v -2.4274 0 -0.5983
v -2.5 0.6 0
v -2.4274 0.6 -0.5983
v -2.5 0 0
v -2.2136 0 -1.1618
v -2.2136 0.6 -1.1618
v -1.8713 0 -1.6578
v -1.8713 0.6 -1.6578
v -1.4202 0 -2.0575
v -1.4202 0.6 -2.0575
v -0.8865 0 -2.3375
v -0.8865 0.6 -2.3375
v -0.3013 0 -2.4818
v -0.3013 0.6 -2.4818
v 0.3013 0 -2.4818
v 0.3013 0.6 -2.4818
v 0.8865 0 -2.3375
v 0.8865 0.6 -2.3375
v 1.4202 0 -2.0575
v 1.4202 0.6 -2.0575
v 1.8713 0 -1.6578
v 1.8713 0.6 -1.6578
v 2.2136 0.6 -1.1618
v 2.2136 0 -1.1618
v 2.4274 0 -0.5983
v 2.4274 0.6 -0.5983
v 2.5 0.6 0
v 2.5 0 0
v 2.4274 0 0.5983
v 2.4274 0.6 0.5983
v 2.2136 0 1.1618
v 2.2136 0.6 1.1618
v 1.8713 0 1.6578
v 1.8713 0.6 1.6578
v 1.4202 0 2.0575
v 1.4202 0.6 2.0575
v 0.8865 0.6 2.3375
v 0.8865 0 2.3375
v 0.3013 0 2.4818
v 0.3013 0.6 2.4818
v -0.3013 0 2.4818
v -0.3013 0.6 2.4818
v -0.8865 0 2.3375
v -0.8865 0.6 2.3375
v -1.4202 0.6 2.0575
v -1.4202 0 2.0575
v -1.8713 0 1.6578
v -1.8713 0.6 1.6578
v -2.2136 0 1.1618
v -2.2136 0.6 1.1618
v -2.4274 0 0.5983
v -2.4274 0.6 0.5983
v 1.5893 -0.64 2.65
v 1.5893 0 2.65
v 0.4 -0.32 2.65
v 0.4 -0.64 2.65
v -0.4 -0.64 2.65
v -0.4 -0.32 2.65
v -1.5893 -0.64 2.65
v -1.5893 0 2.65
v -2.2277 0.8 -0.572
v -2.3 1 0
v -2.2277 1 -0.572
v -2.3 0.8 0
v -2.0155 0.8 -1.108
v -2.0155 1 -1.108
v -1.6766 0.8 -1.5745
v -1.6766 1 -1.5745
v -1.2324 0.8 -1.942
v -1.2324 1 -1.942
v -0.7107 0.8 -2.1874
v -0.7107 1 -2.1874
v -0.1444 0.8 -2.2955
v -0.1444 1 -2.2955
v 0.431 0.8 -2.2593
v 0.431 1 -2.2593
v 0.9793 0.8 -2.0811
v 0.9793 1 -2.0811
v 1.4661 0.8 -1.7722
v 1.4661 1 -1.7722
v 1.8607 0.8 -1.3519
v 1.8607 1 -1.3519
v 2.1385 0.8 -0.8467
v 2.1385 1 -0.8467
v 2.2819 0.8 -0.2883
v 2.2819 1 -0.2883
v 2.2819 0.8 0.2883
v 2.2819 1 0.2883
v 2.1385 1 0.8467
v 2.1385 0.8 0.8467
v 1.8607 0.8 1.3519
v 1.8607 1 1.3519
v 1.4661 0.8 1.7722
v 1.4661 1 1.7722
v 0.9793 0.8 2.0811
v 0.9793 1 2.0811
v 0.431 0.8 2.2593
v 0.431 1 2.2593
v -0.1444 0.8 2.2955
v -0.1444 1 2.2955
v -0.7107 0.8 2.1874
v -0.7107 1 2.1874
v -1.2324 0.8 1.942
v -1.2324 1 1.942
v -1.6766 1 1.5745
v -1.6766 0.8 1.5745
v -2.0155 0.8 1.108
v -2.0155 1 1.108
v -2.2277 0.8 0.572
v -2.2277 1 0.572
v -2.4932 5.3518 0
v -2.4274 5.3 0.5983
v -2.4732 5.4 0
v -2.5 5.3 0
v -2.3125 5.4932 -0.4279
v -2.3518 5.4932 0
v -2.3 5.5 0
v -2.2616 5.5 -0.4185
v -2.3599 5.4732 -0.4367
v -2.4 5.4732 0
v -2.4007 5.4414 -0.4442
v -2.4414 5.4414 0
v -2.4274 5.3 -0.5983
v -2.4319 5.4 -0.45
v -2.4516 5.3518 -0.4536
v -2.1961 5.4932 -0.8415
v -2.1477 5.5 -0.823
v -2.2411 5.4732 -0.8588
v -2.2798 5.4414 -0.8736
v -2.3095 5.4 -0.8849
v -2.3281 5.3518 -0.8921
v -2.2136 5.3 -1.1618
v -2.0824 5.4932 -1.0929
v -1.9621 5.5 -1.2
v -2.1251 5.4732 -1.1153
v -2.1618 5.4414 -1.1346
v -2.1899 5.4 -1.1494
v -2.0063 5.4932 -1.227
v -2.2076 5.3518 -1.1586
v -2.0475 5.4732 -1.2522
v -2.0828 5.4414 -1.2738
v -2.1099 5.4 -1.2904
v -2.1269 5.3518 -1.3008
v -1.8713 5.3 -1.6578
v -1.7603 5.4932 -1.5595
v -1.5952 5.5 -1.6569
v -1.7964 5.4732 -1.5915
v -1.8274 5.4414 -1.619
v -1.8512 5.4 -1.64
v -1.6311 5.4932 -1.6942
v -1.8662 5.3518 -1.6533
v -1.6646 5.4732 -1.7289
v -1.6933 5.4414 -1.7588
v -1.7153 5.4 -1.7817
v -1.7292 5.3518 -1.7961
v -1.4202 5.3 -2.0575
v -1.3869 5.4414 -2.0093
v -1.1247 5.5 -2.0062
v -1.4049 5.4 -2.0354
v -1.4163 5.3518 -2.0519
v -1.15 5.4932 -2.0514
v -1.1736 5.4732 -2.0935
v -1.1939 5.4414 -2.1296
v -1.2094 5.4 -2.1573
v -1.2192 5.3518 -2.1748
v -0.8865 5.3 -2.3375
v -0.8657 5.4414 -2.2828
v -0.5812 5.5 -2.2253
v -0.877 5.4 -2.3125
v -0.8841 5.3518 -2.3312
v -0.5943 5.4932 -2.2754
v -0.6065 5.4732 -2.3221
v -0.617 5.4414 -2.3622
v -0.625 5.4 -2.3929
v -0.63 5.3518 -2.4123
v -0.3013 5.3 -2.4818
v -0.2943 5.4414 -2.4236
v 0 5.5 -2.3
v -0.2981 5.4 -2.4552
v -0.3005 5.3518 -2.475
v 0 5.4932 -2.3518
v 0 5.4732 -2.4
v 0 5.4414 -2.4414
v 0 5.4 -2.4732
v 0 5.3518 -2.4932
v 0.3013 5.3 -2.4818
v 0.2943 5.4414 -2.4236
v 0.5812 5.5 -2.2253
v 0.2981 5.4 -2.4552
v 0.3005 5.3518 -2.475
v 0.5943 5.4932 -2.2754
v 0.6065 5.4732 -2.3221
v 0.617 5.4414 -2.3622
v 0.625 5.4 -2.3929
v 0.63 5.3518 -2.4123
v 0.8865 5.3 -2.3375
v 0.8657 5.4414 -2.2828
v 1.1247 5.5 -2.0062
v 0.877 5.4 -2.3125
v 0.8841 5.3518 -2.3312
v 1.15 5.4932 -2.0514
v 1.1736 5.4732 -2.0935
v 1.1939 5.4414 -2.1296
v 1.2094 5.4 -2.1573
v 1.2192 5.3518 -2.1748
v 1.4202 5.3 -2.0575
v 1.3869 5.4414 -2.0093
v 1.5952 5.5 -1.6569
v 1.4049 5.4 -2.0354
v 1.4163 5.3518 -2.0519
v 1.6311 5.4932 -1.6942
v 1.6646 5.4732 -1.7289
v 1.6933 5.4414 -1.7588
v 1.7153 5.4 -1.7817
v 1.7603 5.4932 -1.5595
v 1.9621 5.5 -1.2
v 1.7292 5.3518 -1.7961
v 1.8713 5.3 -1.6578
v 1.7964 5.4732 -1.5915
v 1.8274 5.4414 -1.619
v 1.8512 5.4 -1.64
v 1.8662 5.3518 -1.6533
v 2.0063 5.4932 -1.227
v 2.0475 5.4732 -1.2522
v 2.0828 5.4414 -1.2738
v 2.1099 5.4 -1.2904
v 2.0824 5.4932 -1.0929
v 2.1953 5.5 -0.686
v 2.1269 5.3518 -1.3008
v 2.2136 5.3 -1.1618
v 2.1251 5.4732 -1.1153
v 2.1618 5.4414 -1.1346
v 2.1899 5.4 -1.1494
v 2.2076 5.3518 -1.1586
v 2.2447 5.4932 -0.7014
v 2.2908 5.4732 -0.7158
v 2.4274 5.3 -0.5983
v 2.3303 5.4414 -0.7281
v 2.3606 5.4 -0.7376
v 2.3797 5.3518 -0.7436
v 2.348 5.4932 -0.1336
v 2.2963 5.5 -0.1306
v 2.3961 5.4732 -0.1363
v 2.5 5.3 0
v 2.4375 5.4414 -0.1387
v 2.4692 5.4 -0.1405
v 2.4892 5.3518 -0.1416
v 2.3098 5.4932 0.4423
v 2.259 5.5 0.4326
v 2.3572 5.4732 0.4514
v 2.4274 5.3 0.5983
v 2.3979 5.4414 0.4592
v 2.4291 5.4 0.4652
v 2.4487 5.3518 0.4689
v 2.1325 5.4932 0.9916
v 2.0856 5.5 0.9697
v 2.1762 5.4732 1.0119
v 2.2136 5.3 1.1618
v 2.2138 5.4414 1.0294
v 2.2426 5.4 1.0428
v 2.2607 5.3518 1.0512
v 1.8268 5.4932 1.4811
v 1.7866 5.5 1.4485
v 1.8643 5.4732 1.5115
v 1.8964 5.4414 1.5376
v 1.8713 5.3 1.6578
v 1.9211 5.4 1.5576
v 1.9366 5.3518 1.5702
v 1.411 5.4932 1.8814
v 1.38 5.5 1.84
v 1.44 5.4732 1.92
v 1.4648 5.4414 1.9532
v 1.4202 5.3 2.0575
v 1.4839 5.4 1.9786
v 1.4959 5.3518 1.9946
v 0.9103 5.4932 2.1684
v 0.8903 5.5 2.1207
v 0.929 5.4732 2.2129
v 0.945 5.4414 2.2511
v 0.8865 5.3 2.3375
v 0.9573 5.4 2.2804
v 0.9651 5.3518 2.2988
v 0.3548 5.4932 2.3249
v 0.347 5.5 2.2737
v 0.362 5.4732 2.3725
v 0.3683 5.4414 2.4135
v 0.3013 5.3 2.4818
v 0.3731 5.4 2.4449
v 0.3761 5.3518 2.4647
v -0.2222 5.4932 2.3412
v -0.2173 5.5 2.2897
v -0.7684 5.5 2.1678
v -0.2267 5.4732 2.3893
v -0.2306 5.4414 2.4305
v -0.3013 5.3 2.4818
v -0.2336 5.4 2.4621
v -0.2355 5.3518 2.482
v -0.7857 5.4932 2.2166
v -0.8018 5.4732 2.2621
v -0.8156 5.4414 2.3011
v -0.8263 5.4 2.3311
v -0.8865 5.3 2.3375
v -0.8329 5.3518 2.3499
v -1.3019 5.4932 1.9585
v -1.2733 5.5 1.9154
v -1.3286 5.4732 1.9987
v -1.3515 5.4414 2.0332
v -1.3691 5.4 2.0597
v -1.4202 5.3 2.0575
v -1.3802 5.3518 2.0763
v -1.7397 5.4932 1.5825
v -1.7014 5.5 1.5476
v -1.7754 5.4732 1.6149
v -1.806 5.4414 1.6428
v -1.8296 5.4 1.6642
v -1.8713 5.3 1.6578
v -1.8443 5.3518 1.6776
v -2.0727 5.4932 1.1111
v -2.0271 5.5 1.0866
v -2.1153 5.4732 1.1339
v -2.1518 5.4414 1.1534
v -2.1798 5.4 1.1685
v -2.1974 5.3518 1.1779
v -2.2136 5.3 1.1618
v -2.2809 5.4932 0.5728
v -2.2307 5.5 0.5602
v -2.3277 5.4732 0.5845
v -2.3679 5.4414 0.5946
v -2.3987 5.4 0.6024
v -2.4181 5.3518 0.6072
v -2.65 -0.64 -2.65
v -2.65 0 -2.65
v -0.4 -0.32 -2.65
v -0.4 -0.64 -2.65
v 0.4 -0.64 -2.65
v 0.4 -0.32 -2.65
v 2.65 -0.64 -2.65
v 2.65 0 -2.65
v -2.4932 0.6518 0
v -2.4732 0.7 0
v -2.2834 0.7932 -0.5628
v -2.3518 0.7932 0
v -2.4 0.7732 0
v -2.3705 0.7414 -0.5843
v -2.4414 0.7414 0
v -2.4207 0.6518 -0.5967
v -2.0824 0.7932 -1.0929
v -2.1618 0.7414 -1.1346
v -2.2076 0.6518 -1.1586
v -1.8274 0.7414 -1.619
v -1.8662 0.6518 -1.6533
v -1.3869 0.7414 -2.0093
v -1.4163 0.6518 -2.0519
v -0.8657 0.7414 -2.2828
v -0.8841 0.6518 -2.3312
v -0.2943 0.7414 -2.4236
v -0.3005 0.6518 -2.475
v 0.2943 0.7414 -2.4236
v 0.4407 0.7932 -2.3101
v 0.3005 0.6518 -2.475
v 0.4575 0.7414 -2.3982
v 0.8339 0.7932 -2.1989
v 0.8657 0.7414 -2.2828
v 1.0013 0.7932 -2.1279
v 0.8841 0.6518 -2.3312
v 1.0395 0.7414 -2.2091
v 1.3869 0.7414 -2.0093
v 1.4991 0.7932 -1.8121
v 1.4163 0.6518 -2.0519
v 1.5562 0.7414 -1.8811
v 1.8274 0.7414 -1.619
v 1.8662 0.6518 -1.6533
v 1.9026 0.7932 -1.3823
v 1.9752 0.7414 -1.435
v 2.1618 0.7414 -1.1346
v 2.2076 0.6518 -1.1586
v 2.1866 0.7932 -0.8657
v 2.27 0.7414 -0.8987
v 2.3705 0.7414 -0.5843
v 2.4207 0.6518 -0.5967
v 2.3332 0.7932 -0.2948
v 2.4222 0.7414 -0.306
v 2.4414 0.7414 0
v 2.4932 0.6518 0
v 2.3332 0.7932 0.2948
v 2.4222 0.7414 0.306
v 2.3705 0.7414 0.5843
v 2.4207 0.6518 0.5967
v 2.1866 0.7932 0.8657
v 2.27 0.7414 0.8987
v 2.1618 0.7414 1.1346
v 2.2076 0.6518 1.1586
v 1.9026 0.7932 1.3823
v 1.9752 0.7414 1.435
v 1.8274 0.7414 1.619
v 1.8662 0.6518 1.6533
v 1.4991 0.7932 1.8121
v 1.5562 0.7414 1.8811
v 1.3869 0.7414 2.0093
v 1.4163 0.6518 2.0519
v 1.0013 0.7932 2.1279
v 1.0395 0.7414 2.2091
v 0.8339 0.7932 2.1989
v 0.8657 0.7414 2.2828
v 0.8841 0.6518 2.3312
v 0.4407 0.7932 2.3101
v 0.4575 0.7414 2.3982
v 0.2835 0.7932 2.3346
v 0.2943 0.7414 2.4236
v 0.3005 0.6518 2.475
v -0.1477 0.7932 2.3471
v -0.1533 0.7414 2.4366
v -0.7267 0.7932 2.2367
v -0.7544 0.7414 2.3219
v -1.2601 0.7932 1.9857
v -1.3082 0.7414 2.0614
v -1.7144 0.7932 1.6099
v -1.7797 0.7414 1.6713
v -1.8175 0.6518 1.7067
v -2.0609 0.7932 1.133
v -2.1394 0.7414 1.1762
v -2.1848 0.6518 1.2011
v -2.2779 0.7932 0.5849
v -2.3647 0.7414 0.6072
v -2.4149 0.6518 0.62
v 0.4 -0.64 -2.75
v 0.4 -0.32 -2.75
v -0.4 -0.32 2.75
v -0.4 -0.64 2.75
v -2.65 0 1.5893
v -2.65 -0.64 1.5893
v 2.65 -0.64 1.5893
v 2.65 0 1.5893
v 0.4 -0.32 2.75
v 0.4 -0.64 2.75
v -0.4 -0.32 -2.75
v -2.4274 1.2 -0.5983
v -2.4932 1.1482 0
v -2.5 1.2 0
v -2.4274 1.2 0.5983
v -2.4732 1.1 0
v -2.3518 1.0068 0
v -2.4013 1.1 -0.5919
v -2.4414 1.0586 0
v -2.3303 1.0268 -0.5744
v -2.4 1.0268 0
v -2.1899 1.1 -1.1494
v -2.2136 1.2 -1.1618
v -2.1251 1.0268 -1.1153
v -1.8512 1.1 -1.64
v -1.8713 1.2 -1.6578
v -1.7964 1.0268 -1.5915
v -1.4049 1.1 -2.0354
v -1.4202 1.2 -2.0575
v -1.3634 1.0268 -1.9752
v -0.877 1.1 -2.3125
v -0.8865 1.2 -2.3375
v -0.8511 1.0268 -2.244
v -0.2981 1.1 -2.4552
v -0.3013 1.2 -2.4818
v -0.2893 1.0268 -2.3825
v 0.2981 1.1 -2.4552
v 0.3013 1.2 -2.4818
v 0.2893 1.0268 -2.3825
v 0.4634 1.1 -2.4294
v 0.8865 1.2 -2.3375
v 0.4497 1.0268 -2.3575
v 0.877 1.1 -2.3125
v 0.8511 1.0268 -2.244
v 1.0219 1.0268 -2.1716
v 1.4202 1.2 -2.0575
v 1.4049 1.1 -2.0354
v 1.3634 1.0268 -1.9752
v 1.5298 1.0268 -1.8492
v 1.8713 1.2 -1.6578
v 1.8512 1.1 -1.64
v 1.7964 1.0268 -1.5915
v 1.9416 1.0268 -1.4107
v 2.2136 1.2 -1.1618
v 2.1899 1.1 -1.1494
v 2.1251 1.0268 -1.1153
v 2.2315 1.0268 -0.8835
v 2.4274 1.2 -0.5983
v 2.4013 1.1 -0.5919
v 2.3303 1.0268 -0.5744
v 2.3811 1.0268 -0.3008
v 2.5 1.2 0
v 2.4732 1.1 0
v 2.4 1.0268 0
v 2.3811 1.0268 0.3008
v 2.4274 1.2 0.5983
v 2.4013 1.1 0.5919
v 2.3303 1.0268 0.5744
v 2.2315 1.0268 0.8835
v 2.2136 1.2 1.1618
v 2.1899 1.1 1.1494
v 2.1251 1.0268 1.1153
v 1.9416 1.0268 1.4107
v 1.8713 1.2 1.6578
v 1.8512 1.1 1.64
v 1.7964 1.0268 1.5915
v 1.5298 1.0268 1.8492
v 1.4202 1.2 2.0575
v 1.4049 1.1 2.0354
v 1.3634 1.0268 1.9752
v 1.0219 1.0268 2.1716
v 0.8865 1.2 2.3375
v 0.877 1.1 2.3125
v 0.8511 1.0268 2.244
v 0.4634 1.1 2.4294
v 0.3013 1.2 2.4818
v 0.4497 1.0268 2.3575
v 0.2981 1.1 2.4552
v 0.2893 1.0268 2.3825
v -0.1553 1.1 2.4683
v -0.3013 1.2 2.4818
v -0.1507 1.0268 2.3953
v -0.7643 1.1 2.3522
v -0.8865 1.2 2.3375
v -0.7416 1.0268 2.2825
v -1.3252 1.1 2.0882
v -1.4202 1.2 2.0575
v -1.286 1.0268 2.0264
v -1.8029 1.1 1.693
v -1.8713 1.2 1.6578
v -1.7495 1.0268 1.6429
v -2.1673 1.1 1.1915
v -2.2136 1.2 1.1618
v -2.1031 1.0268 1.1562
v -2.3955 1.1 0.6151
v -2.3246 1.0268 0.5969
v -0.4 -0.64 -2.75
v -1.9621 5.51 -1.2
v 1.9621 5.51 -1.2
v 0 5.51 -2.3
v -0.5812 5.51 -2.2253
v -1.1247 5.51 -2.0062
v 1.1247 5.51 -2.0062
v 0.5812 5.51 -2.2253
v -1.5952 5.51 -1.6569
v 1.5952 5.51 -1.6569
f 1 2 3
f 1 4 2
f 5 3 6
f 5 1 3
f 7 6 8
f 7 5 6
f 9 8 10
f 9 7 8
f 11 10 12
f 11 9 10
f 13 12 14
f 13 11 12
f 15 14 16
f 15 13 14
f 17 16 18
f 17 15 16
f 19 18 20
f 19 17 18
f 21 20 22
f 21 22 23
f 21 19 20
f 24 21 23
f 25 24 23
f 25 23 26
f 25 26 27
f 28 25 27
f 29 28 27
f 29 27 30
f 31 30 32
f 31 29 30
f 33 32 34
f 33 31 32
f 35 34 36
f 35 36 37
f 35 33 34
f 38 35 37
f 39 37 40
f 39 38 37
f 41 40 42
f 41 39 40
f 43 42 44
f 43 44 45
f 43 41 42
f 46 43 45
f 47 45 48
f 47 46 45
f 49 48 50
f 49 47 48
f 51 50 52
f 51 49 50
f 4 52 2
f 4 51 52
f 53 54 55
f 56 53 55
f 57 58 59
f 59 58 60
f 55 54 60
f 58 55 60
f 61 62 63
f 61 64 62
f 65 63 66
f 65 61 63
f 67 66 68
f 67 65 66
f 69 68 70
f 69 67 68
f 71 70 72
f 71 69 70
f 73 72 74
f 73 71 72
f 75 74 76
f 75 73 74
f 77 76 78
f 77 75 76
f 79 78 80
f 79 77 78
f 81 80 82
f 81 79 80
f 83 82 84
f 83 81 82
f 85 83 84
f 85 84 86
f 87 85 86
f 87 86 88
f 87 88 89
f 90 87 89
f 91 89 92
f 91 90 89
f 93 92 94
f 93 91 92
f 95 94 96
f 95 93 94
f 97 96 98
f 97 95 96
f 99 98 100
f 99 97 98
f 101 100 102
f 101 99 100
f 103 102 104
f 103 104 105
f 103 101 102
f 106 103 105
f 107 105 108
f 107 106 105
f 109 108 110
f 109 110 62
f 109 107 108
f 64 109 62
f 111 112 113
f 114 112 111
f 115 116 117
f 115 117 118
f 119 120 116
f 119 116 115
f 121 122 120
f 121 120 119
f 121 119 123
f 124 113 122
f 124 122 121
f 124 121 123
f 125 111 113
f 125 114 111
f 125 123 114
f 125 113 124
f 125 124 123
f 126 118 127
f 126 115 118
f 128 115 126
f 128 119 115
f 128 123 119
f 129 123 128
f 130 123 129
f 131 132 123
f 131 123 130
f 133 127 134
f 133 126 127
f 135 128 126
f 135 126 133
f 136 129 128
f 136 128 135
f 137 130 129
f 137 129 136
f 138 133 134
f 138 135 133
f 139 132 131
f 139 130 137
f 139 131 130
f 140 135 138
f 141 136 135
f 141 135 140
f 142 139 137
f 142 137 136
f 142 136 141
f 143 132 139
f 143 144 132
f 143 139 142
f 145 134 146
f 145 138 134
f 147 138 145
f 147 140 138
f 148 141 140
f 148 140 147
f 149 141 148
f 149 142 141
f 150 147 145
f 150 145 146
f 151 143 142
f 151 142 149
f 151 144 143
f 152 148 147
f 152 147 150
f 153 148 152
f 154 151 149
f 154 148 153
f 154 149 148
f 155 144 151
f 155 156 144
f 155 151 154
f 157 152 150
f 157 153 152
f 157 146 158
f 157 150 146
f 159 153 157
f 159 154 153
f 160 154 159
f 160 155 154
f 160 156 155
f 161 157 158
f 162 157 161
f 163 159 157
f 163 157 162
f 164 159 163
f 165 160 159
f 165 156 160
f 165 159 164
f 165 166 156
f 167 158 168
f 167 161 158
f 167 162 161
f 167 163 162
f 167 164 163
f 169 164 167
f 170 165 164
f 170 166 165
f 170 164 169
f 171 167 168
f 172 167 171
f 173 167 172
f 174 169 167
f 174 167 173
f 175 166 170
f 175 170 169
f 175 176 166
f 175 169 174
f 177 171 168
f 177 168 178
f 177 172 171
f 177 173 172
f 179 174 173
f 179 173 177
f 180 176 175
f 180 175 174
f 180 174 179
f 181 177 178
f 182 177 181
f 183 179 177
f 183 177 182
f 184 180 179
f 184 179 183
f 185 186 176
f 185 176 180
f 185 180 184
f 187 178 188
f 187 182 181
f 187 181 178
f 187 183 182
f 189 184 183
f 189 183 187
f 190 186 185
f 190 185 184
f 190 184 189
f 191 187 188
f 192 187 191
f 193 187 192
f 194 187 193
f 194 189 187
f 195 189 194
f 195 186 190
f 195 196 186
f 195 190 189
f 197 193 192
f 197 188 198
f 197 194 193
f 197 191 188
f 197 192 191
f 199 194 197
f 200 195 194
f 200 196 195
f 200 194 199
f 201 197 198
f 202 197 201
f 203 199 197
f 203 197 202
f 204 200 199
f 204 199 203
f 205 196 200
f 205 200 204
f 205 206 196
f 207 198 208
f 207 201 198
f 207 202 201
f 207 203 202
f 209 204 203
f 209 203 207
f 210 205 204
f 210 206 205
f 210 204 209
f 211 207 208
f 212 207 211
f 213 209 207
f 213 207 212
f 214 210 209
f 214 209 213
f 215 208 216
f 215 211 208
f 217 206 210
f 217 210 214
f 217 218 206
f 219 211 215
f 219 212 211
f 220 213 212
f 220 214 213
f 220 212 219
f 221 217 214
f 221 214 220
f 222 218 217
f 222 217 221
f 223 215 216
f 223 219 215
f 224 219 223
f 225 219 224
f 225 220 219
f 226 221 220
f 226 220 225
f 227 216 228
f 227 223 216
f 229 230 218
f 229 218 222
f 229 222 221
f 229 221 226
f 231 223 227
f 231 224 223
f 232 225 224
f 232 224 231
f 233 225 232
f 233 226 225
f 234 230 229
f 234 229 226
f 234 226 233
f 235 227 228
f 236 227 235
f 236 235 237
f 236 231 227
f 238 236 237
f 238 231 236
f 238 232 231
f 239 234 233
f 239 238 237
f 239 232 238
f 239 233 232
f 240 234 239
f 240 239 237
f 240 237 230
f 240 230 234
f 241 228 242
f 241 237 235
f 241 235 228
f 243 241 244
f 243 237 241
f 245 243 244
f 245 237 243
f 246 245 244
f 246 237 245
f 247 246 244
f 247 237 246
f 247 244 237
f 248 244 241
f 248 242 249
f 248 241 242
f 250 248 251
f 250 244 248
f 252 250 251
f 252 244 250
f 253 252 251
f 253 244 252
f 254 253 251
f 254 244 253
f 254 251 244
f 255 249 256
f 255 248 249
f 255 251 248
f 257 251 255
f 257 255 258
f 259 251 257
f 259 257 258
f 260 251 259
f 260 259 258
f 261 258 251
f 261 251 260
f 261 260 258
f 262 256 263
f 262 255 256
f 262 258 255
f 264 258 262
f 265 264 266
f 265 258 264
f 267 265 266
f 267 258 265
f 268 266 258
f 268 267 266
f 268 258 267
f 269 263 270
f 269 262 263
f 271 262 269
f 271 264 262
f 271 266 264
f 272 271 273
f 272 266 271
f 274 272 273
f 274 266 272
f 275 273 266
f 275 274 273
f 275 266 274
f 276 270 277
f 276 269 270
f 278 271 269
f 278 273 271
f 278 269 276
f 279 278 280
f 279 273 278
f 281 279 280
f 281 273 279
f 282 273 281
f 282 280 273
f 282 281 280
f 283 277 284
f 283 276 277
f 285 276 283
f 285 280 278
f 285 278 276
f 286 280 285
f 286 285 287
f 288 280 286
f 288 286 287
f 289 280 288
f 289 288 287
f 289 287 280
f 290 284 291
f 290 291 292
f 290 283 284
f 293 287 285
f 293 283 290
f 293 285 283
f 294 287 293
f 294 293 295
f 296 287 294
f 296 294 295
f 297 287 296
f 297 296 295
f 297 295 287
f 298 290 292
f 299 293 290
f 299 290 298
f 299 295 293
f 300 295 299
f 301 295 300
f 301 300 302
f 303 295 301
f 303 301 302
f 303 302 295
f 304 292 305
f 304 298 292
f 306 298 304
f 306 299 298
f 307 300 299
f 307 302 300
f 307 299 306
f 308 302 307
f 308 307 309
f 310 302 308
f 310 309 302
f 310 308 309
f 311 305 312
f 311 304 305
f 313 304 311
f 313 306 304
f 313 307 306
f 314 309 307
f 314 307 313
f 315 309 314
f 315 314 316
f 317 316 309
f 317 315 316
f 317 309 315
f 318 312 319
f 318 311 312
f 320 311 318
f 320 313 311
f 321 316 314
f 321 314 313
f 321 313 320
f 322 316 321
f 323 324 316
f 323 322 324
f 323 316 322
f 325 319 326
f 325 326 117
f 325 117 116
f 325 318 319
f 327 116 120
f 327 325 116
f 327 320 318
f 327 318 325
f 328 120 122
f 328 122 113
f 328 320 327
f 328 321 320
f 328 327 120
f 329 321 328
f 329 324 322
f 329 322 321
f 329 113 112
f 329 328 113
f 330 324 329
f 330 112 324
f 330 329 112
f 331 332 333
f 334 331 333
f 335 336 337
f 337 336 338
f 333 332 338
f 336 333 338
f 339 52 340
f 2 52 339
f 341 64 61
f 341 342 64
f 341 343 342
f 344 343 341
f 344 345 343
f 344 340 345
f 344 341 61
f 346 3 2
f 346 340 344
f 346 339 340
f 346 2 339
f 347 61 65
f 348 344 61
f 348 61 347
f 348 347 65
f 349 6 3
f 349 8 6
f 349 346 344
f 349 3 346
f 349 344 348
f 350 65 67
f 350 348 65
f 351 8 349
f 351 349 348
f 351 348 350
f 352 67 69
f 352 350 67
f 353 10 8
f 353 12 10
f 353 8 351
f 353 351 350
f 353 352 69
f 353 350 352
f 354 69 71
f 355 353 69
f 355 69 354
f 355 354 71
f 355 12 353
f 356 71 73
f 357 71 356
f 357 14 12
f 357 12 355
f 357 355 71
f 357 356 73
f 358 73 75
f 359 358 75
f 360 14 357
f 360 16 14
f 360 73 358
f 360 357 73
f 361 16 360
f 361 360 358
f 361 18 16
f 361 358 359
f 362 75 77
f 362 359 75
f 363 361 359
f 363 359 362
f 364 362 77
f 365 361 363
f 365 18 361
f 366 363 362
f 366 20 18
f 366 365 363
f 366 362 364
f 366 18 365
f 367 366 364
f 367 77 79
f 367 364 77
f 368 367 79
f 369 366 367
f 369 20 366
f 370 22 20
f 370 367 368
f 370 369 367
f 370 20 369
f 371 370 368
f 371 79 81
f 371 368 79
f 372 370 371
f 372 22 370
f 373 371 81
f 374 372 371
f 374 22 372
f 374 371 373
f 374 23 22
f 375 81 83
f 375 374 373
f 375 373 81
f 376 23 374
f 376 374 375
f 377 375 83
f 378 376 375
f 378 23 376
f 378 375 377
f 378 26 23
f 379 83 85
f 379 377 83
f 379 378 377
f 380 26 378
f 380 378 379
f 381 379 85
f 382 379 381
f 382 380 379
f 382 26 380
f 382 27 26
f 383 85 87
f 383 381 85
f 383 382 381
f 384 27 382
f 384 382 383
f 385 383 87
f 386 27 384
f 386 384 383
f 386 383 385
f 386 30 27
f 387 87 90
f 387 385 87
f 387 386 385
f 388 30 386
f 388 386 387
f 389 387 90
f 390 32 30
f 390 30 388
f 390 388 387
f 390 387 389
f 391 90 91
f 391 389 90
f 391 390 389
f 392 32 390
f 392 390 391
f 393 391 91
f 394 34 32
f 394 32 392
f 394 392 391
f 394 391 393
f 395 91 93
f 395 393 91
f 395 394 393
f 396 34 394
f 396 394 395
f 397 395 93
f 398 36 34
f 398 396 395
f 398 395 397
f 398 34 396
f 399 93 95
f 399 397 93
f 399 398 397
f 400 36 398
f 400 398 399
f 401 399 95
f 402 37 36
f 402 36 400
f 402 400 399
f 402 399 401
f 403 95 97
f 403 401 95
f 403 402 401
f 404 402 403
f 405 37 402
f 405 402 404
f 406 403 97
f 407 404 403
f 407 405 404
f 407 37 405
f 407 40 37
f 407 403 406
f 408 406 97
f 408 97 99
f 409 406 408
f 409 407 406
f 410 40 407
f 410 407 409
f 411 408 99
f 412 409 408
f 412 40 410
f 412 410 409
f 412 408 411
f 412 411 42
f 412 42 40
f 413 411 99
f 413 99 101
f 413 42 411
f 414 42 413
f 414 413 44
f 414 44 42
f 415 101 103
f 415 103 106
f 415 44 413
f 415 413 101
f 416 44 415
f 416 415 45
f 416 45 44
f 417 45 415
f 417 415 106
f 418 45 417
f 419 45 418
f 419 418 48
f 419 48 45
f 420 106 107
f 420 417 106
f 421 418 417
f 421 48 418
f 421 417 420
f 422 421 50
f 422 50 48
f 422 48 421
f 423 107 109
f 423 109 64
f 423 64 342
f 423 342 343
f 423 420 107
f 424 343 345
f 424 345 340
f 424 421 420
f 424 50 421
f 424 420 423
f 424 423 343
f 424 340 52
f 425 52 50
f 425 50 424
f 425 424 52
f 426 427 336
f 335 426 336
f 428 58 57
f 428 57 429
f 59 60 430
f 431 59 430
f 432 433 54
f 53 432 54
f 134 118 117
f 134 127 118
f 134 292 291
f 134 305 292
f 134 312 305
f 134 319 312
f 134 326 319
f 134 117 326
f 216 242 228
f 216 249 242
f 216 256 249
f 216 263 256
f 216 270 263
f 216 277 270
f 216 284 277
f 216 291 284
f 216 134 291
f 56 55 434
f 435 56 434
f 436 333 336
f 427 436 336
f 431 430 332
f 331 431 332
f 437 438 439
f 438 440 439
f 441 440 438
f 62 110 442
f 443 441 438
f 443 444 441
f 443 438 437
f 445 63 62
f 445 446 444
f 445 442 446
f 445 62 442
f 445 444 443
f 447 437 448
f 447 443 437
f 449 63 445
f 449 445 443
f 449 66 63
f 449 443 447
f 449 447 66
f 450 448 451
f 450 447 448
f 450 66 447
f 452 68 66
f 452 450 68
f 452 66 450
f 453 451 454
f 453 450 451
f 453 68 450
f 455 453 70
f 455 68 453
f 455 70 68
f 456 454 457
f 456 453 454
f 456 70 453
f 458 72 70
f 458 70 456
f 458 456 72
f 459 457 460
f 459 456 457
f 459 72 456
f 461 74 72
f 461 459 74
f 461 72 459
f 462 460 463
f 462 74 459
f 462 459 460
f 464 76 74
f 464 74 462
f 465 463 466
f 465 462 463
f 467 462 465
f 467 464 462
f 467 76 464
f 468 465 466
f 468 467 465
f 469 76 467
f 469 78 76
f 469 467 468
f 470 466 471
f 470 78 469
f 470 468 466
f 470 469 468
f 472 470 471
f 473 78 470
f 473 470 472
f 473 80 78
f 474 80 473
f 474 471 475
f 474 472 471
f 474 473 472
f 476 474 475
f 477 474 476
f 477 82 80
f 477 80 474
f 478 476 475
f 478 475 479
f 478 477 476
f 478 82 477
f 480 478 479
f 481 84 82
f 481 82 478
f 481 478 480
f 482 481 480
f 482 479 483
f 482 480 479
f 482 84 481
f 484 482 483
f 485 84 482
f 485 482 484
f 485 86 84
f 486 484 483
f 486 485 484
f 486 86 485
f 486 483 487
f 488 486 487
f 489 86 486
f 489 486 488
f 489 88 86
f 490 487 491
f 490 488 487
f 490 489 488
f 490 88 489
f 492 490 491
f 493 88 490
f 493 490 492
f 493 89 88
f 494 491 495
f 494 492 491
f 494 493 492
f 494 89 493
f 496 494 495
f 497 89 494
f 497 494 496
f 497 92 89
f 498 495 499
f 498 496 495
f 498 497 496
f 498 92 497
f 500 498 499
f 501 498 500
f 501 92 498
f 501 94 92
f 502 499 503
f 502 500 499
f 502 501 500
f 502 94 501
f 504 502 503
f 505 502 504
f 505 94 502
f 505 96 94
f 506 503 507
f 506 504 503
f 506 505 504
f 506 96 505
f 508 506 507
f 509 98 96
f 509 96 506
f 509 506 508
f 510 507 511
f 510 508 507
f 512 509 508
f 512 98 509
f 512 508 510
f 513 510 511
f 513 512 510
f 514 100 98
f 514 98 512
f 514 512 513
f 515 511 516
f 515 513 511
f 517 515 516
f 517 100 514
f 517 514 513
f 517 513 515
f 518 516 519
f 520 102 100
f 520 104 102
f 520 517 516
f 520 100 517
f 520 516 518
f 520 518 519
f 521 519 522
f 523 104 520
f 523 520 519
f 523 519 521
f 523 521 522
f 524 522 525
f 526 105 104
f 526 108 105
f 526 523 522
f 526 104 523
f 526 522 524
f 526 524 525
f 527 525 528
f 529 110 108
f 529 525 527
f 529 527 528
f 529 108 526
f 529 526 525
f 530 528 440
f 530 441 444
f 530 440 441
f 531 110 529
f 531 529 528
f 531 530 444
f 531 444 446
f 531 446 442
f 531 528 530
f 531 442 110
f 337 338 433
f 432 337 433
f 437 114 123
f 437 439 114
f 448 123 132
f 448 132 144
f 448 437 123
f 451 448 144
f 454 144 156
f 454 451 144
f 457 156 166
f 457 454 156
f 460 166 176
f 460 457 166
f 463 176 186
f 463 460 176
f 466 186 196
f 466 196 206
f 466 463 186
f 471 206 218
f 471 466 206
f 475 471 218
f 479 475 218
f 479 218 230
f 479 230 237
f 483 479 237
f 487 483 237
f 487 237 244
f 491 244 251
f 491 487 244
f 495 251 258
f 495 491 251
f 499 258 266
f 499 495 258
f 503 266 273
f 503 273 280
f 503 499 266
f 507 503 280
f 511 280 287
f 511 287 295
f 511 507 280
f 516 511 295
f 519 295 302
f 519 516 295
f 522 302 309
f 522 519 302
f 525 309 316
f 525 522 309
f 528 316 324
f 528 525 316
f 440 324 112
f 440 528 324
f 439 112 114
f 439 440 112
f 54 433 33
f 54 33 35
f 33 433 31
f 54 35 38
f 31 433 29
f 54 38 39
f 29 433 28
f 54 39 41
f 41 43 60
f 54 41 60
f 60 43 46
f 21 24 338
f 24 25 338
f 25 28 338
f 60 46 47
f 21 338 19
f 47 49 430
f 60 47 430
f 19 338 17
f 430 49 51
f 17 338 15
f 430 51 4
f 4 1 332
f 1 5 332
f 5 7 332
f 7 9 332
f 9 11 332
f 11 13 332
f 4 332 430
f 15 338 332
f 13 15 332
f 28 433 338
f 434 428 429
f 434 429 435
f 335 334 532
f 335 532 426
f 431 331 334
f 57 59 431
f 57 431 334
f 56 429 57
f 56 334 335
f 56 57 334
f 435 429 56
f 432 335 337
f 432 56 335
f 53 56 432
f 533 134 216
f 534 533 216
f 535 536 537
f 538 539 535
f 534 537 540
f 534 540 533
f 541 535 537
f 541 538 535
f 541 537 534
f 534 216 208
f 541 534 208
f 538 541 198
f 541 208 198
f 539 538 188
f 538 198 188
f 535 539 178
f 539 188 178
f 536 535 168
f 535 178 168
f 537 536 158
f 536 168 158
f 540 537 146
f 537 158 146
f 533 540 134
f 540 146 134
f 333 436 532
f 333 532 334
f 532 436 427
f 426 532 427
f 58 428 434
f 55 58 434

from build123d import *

# Parameters (mm, degrees)
BOSS_EXTRUDE1_DEPTH = 0.01
BOSS_EXTRUDE2_DEPTH = 0.64
CUT_EXTRUDE1_START  = 0.64
CUT_EXTRUDE1_DEPTH  = 0.32
SKETCH4_W           = 0.8
SKETCH4_H           = 2.25
BOSS_EXTRUDE3_DEPTH = 0.32


with BuildPart() as part:
    # Sketch1 → Revolve1 (revolve)
    with BuildSketch(Plane.XY):
        with BuildLine():
            Line((0, 5.5), (-2.3, 5.5))
            ThreePointArc((-2.3, 5.5), (-2.441421356, 5.441421356), (-2.5, 5.3))
            Line((-2.5, 5.3), (-2.5, 1.2))
            ThreePointArc((-2.5, 1.2), (-2.441421356, 1.058578644), (-2.3, 1))
            Line((-2.3, 1), (-2.3, 0.8))
            ThreePointArc((-2.3, 0.8), (-2.441421356, 0.741421356), (-2.5, 0.6))
            Line((-2.5, 0.6), (-2.5, 0))
            Line((-2.5, 0), (0, 0))
            Line((0, 0), (0, 5.5))
        make_face()
    revolve(axis=Axis((0, 8.082229881, 0), (0, -1, 0)))

    # Sketch2 → Boss-Extrude1 (add)
    with BuildSketch(Plane(origin=(0, 5.5, 0), x_dir=(1, 0, 0), z_dir=(0, 1, 0))):
        with BuildLine():
            Line((-1.962141687, 1.2), (1.962141687, 1.2))
            ThreePointArc((1.962141687, 1.2), (0, 2.3), (-1.962141687, 1.2))
        make_face()
    extrude(amount=BOSS_EXTRUDE1_DEPTH)

    # Sketch3 → Boss-Extrude2 (add)
    with BuildSketch(Plane(origin=(0, 0, 0), x_dir=(-1, 0, 0), z_dir=(0, -1, 0))):
        Polygon((1.589339828, -2.65), (2.65, -1.589339828), (2.65, 2.65), (-2.65, 2.65), (-2.65, -1.589339828), (-1.589339828, -2.65), align=None)
    extrude(amount=BOSS_EXTRUDE2_DEPTH)

    # Sketch3<3> → Cut-Extrude1 (cut)
    with BuildSketch(Plane(origin=(0, 0, 0), x_dir=(-1, 0, 0), z_dir=(0, -1, 0)).offset(CUT_EXTRUDE1_START)):
        with BuildLine():
            Line((0.4, 0.5), (0.4, 2.467792536))
            ThreePointArc((0.4, 2.467792536), (0, 2.5), (-0.4, 2.467792536))
            Line((-0.4, 2.467792536), (-0.4, 0.5))
            Line((-0.4, 0.5), (0.4, 0.5))
        make_face()
        with BuildLine():
            ThreePointArc((-0.4, -2.467792536), (0, -2.5), (0.4, -2.467792536))
            Line((0.4, -2.467792536), (0.4, -0.5))
            Line((0.4, -0.5), (-0.4, -0.5))
            Line((-0.4, -0.5), (-0.4, -2.467792536))
        make_face()
        with BuildLine():
            Line((0.4, 2.467792536), (0.4, 2.65))
            Line((0.4, 2.65), (-0.4, 2.65))
            Line((-0.4, 2.65), (-0.4, 2.467792536))
            ThreePointArc((-0.4, 2.467792536), (0, 2.5), (0.4, 2.467792536))
        make_face()
        with BuildLine():
            Line((-0.4, -2.65), (0.4, -2.65))
            Line((0.4, -2.65), (0.4, -2.467792536))
            ThreePointArc((0.4, -2.467792536), (0, -2.5), (-0.4, -2.467792536))
            Line((-0.4, -2.467792536), (-0.4, -2.65))
        make_face()
    extrude(amount=-CUT_EXTRUDE1_DEPTH, mode=Mode.SUBTRACT)

    # Sketch4 → Boss-Extrude3 (add)
    with BuildSketch(Plane.XZ.offset(0.32)):
        with Locations((0, -1.625)):
            Rectangle(SKETCH4_W, SKETCH4_H)
        with Locations((0, 1.625)):
            Rectangle(SKETCH4_W, SKETCH4_H)
    extrude(amount=BOSS_EXTRUDE3_DEPTH)


solid = part.part
